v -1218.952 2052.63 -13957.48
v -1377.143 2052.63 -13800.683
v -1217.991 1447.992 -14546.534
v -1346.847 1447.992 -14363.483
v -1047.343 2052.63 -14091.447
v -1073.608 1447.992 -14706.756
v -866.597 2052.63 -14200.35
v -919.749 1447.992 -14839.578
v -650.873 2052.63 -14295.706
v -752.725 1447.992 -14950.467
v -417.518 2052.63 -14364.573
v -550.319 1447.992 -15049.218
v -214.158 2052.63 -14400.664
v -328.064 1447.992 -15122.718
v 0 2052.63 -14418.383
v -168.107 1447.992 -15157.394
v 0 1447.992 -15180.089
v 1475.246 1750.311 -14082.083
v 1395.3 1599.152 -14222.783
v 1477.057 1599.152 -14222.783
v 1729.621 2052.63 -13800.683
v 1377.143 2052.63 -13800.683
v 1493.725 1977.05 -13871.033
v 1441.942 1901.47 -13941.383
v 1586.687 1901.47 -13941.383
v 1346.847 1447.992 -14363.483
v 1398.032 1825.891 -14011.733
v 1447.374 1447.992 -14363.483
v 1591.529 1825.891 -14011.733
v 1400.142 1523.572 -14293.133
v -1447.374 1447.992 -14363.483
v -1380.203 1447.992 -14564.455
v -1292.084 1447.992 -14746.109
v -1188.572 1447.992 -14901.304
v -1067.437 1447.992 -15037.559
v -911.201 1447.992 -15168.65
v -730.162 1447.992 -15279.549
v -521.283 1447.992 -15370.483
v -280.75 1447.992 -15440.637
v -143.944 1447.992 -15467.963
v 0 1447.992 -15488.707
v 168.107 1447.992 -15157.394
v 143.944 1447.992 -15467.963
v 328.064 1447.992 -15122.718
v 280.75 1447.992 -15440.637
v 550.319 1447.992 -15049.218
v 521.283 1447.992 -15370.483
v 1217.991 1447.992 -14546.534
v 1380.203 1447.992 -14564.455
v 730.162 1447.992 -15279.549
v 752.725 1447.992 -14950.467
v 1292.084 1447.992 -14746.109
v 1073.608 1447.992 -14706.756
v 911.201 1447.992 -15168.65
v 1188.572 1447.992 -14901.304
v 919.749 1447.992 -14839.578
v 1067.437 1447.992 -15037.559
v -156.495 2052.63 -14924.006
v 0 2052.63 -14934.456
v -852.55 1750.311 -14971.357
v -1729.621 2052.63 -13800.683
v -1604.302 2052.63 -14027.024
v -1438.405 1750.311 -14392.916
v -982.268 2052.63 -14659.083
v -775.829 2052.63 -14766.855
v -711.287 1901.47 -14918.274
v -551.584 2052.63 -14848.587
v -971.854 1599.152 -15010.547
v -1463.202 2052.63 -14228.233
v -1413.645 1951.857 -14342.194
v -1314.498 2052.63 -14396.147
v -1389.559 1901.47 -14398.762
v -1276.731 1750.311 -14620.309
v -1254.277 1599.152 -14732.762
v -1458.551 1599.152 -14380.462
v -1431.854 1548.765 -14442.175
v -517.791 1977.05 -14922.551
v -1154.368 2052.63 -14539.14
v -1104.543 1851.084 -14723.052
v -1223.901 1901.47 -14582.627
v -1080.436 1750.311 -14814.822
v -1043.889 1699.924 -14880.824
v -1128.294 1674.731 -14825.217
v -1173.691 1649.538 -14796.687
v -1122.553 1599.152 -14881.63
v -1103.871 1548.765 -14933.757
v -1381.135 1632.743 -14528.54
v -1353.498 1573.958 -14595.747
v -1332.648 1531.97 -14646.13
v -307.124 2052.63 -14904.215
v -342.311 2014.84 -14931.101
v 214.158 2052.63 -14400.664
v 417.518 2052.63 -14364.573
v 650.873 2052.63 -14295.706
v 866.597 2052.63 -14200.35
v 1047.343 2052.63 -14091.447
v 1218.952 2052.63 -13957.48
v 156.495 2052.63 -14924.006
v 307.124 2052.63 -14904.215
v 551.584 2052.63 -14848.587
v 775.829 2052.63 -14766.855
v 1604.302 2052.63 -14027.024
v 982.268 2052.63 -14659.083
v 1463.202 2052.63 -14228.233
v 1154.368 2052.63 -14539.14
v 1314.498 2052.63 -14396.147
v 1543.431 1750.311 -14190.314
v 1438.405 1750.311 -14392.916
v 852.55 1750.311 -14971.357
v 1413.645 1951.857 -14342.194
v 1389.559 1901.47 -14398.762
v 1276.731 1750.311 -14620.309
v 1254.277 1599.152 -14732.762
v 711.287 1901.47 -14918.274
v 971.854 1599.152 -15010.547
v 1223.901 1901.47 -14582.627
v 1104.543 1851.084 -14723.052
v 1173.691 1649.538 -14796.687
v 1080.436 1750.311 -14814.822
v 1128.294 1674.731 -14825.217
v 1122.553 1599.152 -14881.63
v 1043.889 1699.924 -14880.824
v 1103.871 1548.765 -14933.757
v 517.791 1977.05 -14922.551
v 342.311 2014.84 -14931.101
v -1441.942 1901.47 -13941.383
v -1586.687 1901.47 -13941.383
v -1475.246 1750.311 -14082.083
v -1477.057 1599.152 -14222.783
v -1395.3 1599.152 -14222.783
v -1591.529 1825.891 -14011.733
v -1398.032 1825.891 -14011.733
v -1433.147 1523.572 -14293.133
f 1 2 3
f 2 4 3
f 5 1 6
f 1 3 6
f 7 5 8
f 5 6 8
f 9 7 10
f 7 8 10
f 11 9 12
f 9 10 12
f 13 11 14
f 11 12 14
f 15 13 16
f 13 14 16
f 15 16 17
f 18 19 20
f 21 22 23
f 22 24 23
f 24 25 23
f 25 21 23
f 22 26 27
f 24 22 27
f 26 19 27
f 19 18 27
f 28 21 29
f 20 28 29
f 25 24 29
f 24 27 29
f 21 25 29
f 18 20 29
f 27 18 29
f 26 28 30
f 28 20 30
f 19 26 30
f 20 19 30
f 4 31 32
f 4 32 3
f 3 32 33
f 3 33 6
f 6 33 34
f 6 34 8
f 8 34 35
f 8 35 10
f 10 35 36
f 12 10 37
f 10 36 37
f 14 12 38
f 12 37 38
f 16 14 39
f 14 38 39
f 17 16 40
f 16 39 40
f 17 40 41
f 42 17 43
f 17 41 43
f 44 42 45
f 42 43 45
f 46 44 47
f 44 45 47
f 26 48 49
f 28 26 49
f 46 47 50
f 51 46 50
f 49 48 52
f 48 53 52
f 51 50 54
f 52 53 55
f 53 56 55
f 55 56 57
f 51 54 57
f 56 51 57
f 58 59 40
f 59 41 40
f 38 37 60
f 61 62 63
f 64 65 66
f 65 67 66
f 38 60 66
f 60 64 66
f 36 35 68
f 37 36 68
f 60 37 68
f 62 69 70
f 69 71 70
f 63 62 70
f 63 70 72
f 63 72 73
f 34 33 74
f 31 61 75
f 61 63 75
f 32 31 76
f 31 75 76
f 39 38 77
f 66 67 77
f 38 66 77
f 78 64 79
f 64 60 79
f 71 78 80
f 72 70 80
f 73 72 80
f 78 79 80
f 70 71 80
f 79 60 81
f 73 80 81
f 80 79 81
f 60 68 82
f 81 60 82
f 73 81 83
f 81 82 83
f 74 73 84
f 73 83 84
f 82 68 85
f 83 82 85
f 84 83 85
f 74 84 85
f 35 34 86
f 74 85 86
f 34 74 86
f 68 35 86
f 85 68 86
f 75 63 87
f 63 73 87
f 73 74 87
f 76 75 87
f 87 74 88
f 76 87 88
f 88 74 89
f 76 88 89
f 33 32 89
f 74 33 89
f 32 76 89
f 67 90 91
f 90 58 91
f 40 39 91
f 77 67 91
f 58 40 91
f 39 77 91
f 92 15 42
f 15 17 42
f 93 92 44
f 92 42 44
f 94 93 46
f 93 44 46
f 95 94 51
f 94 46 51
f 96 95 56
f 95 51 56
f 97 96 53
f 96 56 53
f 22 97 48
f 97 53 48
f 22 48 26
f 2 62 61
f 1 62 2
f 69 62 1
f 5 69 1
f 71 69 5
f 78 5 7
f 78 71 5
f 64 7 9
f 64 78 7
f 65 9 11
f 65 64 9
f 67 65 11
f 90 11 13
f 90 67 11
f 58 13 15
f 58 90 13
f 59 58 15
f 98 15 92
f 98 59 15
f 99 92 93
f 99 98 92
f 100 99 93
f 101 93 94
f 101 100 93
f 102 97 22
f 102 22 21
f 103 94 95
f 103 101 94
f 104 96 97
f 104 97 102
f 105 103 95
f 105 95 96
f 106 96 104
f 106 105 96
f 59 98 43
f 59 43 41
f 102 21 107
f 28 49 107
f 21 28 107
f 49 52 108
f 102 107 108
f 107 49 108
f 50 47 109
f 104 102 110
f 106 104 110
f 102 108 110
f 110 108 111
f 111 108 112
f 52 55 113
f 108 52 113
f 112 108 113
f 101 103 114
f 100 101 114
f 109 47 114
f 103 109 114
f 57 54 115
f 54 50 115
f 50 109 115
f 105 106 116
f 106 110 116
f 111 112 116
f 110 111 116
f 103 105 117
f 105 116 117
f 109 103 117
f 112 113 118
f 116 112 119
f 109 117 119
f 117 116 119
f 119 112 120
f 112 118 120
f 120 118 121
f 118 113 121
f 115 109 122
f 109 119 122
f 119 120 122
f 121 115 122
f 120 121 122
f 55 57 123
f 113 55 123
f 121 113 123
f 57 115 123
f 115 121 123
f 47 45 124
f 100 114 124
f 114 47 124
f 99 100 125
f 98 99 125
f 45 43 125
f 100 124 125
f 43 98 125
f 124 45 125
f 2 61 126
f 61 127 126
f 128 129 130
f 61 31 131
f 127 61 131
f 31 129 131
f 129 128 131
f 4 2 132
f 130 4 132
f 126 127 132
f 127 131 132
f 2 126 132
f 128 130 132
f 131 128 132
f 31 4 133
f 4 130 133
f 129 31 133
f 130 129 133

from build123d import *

# Parameters (mm, degrees)
BOSS_EXTRUDE1_DEPTH      = 76.2
BOSS_EXTRUDE2_DEPTH      = 25873.085069
BOSS_EXTRUDE2_DEPTH_BACK = 11480.154931
SKETCH6_R                = 2240.28
SKETCH6_R_2              = 2151.38
CUT_EXTRUDE2_DEPTH       = 40152.227650453
CUT_EXTRUDE2_DEPTH_BACK  = 40152.227650453
SKETCH9_R                = 2603.835118227
SKETCH9_R_2              = 2240.28
SKETCH16_R               = 2240.28
SKETCH17_R               = 355.259859159
SKETCH39_R               = 2240.28
BOSS_EXTRUDE5_DEPTH      = 1158.989431677
SKETCH40_W               = 22247.712993738
SKETCH40_H               = 18439.107036522
CUT_EXTRUDE9_DEPTH       = 47201.096742261


with BuildPart() as part:
    # Sketch4 → Boss-Extrude1 (new body)
    with BuildSketch(Plane(origin=(0, 0, 0), x_dir=(1, 0, 0), z_dir=(0, 1, 0))):
        with BuildLine():
            Line((-2240.28, 11480.154930676), (-2240.28, -25873.085069324))
            add(Edge.make_bspline(
                [(-2240.28, -25873.085069324), (-1878.626183949, -27707.433501437), (0, -28507.09818)],
                knots=[0, 0, 0, 1, 1, 1], degree=2))
            add(Edge.make_bspline(
                [(2240.28, -25873.085069324), (1878.62618395, -27707.433501437), (0, -28507.09818)],
                knots=[0, 0, 0, 1, 1, 1], degree=2))
            Line((2240.28, -25873.085069324), (2240.28, 11480.154930676))
            Line((2240.28, 11480.154930676), (-2240.28, 11480.154930676))
        make_face()
    extrude(amount=BOSS_EXTRUDE1_DEPTH)

    # Sketch6 → Boss-Extrude2 (add, two sides: drawn at the far end of the back side and taken through both)
    with BuildSketch(Plane.XY.offset(-BOSS_EXTRUDE2_DEPTH_BACK)):
        with Locations((0, 609.6)):
            Circle(SKETCH6_R)
        with Locations((0, 609.6)):
            Circle(SKETCH6_R_2, mode=Mode.SUBTRACT)
    extrude(amount=BOSS_EXTRUDE2_DEPTH + BOSS_EXTRUDE2_DEPTH_BACK)

    # Sketch9 → Cut-Extrude2 (cut, two sides: drawn at the far end of the back side and taken through both)
    with BuildSketch(Plane(origin=(0, 0, -11480.154930676), x_dir=(-1, 0, 0), z_dir=(0, 0, -1)).offset(-CUT_EXTRUDE2_DEPTH_BACK)):
        with Locations((0, 609.6)):
            Circle(SKETCH9_R)
        with Locations(Location((0, 609.6, 0), (0, 0, 346.225853002))):
            Circle(SKETCH9_R_2, mode=Mode.SUBTRACT)
    extrude(amount=CUT_EXTRUDE2_DEPTH + CUT_EXTRUDE2_DEPTH_BACK, mode=Mode.SUBTRACT)

    # Sketch16 → Loft1 section 0
    with BuildSketch(Plane.XY.offset(25873.085069324)):
        with Locations((0, 609.6)):
            Circle(SKETCH16_R)
    # Sketch15 → Loft1 section 1
    with BuildSketch(Plane.XY.offset(31657.776596271)):
        with BuildLine():
            add(Edge.make_bspline(
                [(0, 2543.01989867), (915.928720581, 2543.01989867), (2286.858534778, -200.689582198), (0, -503.660012782), (-2286.858534778, -200.689582198), (-915.928720581, 2543.01989867), (0, 2543.01989867)],
                knots=[0, 0, 0, 0, 0.334053834, 0.5, 0.665946166, 1, 1, 1, 1], degree=3))
        make_face()
    # Sketch17 → Loft1 section 2
    with BuildSketch(Plane.XY.offset(34418.206950084)):
        with Locations((0, 1489.004579609)):
            Circle(SKETCH17_R)
    loft()

    # Sketch39 → Boss-Extrude5 (add)
    with BuildSketch(Plane(origin=(0, 0, -11480.154930676), x_dir=(-1, 0, 0), z_dir=(0, 0, -1))):
        with Locations((0, 609.6)):
            Circle(SKETCH39_R)
    extrude(amount=BOSS_EXTRUDE5_DEPTH)

    # Sketch40 → Cut-Extrude9 (cut, through all)
    with BuildSketch(Plane(origin=(0, 0, -12639.144362353), x_dir=(-1, 0, 0), z_dir=(0, 0, -1))):
        Rectangle(SKETCH40_W, SKETCH40_H)
    extrude(amount=-CUT_EXTRUDE9_DEPTH, mode=Mode.SUBTRACT)


with BuildPart() as body_2:
    # Sketch41 → Loft2 section 0
    with BuildSketch(Plane(origin=(0, 2052.629606143, 0), x_dir=(1, 0, 0), z_dir=(0, 1, 0))):
        with BuildLine():
            Line((-1729.620971703, 13800.682850485), (-1377.142886148, 13800.682850485))
            add(Edge.make_bspline(
                [(-1377.142886148, 13800.682850485), (-850.648259402, 14385.325069701), (0, 14418.383322118)],
                knots=[0, 0, 0, 1, 1, 1], degree=2))
            add(Edge.make_bspline(
                [(1377.142886148, 13800.682850485), (850.648259402, 14385.325069701), (0, 14418.383322118)],
                knots=[0, 0, 0, 1, 1, 1], degree=2))
            Line((1377.142886148, 13800.682850485), (1729.620971703, 13800.682850485))
            add(Edge.make_bspline(
                [(1729.620971703, 13800.682850485), (1193.606895017, 14891.192200236), (0, 14934.455787556)],
                knots=[0, 0, 0, 1, 1, 1], degree=2))
            add(Edge.make_bspline(
                [(-1729.620971703, 13800.682850485), (-1193.606895017, 14891.192200236), (0, 14934.455787556)],
                knots=[0, 0, 0, 1, 1, 1], degree=2))
        make_face()
    # Sketch42 → Loft2 section 1
    with BuildSketch(Plane(origin=(0, 1447.99219123, 0), x_dir=(1, 0, 0), z_dir=(0, 1, 0))):
        with BuildLine():
            Line((-1447.374386664, 14363.482994407), (-1346.847413691, 14363.482994407))
            add(Edge.make_bspline(
                [(-1346.847413691, 14363.482994407), (-892.254112883, 15093.527338448), (0, 15180.088861613)],
                knots=[0, 0, 0, 1, 1, 1], degree=2))
            add(Edge.make_bspline(
                [(1346.847413691, 14363.482994407), (892.254112883, 15093.527338448), (0, 15180.088861613)],
                knots=[0, 0, 0, 1, 1, 1], degree=2))
            Line((1346.847413691, 14363.482994407), (1447.374386664, 14363.482994407))
            add(Edge.make_bspline(
                [(1447.374386664, 14363.482994407), (1182.130026726, 15348.85351601), (0, 15488.706628883)],
                knots=[0, 0, 0, 1, 1, 1], degree=2))
            add(Edge.make_bspline(
                [(-1447.374386664, 14363.482994407), (-1182.130026726, 15348.85351601), (0, 15488.706628883)],
                knots=[0, 0, 0, 1, 1, 1], degree=2))
        make_face()
    loft()


solid = body_2.part
